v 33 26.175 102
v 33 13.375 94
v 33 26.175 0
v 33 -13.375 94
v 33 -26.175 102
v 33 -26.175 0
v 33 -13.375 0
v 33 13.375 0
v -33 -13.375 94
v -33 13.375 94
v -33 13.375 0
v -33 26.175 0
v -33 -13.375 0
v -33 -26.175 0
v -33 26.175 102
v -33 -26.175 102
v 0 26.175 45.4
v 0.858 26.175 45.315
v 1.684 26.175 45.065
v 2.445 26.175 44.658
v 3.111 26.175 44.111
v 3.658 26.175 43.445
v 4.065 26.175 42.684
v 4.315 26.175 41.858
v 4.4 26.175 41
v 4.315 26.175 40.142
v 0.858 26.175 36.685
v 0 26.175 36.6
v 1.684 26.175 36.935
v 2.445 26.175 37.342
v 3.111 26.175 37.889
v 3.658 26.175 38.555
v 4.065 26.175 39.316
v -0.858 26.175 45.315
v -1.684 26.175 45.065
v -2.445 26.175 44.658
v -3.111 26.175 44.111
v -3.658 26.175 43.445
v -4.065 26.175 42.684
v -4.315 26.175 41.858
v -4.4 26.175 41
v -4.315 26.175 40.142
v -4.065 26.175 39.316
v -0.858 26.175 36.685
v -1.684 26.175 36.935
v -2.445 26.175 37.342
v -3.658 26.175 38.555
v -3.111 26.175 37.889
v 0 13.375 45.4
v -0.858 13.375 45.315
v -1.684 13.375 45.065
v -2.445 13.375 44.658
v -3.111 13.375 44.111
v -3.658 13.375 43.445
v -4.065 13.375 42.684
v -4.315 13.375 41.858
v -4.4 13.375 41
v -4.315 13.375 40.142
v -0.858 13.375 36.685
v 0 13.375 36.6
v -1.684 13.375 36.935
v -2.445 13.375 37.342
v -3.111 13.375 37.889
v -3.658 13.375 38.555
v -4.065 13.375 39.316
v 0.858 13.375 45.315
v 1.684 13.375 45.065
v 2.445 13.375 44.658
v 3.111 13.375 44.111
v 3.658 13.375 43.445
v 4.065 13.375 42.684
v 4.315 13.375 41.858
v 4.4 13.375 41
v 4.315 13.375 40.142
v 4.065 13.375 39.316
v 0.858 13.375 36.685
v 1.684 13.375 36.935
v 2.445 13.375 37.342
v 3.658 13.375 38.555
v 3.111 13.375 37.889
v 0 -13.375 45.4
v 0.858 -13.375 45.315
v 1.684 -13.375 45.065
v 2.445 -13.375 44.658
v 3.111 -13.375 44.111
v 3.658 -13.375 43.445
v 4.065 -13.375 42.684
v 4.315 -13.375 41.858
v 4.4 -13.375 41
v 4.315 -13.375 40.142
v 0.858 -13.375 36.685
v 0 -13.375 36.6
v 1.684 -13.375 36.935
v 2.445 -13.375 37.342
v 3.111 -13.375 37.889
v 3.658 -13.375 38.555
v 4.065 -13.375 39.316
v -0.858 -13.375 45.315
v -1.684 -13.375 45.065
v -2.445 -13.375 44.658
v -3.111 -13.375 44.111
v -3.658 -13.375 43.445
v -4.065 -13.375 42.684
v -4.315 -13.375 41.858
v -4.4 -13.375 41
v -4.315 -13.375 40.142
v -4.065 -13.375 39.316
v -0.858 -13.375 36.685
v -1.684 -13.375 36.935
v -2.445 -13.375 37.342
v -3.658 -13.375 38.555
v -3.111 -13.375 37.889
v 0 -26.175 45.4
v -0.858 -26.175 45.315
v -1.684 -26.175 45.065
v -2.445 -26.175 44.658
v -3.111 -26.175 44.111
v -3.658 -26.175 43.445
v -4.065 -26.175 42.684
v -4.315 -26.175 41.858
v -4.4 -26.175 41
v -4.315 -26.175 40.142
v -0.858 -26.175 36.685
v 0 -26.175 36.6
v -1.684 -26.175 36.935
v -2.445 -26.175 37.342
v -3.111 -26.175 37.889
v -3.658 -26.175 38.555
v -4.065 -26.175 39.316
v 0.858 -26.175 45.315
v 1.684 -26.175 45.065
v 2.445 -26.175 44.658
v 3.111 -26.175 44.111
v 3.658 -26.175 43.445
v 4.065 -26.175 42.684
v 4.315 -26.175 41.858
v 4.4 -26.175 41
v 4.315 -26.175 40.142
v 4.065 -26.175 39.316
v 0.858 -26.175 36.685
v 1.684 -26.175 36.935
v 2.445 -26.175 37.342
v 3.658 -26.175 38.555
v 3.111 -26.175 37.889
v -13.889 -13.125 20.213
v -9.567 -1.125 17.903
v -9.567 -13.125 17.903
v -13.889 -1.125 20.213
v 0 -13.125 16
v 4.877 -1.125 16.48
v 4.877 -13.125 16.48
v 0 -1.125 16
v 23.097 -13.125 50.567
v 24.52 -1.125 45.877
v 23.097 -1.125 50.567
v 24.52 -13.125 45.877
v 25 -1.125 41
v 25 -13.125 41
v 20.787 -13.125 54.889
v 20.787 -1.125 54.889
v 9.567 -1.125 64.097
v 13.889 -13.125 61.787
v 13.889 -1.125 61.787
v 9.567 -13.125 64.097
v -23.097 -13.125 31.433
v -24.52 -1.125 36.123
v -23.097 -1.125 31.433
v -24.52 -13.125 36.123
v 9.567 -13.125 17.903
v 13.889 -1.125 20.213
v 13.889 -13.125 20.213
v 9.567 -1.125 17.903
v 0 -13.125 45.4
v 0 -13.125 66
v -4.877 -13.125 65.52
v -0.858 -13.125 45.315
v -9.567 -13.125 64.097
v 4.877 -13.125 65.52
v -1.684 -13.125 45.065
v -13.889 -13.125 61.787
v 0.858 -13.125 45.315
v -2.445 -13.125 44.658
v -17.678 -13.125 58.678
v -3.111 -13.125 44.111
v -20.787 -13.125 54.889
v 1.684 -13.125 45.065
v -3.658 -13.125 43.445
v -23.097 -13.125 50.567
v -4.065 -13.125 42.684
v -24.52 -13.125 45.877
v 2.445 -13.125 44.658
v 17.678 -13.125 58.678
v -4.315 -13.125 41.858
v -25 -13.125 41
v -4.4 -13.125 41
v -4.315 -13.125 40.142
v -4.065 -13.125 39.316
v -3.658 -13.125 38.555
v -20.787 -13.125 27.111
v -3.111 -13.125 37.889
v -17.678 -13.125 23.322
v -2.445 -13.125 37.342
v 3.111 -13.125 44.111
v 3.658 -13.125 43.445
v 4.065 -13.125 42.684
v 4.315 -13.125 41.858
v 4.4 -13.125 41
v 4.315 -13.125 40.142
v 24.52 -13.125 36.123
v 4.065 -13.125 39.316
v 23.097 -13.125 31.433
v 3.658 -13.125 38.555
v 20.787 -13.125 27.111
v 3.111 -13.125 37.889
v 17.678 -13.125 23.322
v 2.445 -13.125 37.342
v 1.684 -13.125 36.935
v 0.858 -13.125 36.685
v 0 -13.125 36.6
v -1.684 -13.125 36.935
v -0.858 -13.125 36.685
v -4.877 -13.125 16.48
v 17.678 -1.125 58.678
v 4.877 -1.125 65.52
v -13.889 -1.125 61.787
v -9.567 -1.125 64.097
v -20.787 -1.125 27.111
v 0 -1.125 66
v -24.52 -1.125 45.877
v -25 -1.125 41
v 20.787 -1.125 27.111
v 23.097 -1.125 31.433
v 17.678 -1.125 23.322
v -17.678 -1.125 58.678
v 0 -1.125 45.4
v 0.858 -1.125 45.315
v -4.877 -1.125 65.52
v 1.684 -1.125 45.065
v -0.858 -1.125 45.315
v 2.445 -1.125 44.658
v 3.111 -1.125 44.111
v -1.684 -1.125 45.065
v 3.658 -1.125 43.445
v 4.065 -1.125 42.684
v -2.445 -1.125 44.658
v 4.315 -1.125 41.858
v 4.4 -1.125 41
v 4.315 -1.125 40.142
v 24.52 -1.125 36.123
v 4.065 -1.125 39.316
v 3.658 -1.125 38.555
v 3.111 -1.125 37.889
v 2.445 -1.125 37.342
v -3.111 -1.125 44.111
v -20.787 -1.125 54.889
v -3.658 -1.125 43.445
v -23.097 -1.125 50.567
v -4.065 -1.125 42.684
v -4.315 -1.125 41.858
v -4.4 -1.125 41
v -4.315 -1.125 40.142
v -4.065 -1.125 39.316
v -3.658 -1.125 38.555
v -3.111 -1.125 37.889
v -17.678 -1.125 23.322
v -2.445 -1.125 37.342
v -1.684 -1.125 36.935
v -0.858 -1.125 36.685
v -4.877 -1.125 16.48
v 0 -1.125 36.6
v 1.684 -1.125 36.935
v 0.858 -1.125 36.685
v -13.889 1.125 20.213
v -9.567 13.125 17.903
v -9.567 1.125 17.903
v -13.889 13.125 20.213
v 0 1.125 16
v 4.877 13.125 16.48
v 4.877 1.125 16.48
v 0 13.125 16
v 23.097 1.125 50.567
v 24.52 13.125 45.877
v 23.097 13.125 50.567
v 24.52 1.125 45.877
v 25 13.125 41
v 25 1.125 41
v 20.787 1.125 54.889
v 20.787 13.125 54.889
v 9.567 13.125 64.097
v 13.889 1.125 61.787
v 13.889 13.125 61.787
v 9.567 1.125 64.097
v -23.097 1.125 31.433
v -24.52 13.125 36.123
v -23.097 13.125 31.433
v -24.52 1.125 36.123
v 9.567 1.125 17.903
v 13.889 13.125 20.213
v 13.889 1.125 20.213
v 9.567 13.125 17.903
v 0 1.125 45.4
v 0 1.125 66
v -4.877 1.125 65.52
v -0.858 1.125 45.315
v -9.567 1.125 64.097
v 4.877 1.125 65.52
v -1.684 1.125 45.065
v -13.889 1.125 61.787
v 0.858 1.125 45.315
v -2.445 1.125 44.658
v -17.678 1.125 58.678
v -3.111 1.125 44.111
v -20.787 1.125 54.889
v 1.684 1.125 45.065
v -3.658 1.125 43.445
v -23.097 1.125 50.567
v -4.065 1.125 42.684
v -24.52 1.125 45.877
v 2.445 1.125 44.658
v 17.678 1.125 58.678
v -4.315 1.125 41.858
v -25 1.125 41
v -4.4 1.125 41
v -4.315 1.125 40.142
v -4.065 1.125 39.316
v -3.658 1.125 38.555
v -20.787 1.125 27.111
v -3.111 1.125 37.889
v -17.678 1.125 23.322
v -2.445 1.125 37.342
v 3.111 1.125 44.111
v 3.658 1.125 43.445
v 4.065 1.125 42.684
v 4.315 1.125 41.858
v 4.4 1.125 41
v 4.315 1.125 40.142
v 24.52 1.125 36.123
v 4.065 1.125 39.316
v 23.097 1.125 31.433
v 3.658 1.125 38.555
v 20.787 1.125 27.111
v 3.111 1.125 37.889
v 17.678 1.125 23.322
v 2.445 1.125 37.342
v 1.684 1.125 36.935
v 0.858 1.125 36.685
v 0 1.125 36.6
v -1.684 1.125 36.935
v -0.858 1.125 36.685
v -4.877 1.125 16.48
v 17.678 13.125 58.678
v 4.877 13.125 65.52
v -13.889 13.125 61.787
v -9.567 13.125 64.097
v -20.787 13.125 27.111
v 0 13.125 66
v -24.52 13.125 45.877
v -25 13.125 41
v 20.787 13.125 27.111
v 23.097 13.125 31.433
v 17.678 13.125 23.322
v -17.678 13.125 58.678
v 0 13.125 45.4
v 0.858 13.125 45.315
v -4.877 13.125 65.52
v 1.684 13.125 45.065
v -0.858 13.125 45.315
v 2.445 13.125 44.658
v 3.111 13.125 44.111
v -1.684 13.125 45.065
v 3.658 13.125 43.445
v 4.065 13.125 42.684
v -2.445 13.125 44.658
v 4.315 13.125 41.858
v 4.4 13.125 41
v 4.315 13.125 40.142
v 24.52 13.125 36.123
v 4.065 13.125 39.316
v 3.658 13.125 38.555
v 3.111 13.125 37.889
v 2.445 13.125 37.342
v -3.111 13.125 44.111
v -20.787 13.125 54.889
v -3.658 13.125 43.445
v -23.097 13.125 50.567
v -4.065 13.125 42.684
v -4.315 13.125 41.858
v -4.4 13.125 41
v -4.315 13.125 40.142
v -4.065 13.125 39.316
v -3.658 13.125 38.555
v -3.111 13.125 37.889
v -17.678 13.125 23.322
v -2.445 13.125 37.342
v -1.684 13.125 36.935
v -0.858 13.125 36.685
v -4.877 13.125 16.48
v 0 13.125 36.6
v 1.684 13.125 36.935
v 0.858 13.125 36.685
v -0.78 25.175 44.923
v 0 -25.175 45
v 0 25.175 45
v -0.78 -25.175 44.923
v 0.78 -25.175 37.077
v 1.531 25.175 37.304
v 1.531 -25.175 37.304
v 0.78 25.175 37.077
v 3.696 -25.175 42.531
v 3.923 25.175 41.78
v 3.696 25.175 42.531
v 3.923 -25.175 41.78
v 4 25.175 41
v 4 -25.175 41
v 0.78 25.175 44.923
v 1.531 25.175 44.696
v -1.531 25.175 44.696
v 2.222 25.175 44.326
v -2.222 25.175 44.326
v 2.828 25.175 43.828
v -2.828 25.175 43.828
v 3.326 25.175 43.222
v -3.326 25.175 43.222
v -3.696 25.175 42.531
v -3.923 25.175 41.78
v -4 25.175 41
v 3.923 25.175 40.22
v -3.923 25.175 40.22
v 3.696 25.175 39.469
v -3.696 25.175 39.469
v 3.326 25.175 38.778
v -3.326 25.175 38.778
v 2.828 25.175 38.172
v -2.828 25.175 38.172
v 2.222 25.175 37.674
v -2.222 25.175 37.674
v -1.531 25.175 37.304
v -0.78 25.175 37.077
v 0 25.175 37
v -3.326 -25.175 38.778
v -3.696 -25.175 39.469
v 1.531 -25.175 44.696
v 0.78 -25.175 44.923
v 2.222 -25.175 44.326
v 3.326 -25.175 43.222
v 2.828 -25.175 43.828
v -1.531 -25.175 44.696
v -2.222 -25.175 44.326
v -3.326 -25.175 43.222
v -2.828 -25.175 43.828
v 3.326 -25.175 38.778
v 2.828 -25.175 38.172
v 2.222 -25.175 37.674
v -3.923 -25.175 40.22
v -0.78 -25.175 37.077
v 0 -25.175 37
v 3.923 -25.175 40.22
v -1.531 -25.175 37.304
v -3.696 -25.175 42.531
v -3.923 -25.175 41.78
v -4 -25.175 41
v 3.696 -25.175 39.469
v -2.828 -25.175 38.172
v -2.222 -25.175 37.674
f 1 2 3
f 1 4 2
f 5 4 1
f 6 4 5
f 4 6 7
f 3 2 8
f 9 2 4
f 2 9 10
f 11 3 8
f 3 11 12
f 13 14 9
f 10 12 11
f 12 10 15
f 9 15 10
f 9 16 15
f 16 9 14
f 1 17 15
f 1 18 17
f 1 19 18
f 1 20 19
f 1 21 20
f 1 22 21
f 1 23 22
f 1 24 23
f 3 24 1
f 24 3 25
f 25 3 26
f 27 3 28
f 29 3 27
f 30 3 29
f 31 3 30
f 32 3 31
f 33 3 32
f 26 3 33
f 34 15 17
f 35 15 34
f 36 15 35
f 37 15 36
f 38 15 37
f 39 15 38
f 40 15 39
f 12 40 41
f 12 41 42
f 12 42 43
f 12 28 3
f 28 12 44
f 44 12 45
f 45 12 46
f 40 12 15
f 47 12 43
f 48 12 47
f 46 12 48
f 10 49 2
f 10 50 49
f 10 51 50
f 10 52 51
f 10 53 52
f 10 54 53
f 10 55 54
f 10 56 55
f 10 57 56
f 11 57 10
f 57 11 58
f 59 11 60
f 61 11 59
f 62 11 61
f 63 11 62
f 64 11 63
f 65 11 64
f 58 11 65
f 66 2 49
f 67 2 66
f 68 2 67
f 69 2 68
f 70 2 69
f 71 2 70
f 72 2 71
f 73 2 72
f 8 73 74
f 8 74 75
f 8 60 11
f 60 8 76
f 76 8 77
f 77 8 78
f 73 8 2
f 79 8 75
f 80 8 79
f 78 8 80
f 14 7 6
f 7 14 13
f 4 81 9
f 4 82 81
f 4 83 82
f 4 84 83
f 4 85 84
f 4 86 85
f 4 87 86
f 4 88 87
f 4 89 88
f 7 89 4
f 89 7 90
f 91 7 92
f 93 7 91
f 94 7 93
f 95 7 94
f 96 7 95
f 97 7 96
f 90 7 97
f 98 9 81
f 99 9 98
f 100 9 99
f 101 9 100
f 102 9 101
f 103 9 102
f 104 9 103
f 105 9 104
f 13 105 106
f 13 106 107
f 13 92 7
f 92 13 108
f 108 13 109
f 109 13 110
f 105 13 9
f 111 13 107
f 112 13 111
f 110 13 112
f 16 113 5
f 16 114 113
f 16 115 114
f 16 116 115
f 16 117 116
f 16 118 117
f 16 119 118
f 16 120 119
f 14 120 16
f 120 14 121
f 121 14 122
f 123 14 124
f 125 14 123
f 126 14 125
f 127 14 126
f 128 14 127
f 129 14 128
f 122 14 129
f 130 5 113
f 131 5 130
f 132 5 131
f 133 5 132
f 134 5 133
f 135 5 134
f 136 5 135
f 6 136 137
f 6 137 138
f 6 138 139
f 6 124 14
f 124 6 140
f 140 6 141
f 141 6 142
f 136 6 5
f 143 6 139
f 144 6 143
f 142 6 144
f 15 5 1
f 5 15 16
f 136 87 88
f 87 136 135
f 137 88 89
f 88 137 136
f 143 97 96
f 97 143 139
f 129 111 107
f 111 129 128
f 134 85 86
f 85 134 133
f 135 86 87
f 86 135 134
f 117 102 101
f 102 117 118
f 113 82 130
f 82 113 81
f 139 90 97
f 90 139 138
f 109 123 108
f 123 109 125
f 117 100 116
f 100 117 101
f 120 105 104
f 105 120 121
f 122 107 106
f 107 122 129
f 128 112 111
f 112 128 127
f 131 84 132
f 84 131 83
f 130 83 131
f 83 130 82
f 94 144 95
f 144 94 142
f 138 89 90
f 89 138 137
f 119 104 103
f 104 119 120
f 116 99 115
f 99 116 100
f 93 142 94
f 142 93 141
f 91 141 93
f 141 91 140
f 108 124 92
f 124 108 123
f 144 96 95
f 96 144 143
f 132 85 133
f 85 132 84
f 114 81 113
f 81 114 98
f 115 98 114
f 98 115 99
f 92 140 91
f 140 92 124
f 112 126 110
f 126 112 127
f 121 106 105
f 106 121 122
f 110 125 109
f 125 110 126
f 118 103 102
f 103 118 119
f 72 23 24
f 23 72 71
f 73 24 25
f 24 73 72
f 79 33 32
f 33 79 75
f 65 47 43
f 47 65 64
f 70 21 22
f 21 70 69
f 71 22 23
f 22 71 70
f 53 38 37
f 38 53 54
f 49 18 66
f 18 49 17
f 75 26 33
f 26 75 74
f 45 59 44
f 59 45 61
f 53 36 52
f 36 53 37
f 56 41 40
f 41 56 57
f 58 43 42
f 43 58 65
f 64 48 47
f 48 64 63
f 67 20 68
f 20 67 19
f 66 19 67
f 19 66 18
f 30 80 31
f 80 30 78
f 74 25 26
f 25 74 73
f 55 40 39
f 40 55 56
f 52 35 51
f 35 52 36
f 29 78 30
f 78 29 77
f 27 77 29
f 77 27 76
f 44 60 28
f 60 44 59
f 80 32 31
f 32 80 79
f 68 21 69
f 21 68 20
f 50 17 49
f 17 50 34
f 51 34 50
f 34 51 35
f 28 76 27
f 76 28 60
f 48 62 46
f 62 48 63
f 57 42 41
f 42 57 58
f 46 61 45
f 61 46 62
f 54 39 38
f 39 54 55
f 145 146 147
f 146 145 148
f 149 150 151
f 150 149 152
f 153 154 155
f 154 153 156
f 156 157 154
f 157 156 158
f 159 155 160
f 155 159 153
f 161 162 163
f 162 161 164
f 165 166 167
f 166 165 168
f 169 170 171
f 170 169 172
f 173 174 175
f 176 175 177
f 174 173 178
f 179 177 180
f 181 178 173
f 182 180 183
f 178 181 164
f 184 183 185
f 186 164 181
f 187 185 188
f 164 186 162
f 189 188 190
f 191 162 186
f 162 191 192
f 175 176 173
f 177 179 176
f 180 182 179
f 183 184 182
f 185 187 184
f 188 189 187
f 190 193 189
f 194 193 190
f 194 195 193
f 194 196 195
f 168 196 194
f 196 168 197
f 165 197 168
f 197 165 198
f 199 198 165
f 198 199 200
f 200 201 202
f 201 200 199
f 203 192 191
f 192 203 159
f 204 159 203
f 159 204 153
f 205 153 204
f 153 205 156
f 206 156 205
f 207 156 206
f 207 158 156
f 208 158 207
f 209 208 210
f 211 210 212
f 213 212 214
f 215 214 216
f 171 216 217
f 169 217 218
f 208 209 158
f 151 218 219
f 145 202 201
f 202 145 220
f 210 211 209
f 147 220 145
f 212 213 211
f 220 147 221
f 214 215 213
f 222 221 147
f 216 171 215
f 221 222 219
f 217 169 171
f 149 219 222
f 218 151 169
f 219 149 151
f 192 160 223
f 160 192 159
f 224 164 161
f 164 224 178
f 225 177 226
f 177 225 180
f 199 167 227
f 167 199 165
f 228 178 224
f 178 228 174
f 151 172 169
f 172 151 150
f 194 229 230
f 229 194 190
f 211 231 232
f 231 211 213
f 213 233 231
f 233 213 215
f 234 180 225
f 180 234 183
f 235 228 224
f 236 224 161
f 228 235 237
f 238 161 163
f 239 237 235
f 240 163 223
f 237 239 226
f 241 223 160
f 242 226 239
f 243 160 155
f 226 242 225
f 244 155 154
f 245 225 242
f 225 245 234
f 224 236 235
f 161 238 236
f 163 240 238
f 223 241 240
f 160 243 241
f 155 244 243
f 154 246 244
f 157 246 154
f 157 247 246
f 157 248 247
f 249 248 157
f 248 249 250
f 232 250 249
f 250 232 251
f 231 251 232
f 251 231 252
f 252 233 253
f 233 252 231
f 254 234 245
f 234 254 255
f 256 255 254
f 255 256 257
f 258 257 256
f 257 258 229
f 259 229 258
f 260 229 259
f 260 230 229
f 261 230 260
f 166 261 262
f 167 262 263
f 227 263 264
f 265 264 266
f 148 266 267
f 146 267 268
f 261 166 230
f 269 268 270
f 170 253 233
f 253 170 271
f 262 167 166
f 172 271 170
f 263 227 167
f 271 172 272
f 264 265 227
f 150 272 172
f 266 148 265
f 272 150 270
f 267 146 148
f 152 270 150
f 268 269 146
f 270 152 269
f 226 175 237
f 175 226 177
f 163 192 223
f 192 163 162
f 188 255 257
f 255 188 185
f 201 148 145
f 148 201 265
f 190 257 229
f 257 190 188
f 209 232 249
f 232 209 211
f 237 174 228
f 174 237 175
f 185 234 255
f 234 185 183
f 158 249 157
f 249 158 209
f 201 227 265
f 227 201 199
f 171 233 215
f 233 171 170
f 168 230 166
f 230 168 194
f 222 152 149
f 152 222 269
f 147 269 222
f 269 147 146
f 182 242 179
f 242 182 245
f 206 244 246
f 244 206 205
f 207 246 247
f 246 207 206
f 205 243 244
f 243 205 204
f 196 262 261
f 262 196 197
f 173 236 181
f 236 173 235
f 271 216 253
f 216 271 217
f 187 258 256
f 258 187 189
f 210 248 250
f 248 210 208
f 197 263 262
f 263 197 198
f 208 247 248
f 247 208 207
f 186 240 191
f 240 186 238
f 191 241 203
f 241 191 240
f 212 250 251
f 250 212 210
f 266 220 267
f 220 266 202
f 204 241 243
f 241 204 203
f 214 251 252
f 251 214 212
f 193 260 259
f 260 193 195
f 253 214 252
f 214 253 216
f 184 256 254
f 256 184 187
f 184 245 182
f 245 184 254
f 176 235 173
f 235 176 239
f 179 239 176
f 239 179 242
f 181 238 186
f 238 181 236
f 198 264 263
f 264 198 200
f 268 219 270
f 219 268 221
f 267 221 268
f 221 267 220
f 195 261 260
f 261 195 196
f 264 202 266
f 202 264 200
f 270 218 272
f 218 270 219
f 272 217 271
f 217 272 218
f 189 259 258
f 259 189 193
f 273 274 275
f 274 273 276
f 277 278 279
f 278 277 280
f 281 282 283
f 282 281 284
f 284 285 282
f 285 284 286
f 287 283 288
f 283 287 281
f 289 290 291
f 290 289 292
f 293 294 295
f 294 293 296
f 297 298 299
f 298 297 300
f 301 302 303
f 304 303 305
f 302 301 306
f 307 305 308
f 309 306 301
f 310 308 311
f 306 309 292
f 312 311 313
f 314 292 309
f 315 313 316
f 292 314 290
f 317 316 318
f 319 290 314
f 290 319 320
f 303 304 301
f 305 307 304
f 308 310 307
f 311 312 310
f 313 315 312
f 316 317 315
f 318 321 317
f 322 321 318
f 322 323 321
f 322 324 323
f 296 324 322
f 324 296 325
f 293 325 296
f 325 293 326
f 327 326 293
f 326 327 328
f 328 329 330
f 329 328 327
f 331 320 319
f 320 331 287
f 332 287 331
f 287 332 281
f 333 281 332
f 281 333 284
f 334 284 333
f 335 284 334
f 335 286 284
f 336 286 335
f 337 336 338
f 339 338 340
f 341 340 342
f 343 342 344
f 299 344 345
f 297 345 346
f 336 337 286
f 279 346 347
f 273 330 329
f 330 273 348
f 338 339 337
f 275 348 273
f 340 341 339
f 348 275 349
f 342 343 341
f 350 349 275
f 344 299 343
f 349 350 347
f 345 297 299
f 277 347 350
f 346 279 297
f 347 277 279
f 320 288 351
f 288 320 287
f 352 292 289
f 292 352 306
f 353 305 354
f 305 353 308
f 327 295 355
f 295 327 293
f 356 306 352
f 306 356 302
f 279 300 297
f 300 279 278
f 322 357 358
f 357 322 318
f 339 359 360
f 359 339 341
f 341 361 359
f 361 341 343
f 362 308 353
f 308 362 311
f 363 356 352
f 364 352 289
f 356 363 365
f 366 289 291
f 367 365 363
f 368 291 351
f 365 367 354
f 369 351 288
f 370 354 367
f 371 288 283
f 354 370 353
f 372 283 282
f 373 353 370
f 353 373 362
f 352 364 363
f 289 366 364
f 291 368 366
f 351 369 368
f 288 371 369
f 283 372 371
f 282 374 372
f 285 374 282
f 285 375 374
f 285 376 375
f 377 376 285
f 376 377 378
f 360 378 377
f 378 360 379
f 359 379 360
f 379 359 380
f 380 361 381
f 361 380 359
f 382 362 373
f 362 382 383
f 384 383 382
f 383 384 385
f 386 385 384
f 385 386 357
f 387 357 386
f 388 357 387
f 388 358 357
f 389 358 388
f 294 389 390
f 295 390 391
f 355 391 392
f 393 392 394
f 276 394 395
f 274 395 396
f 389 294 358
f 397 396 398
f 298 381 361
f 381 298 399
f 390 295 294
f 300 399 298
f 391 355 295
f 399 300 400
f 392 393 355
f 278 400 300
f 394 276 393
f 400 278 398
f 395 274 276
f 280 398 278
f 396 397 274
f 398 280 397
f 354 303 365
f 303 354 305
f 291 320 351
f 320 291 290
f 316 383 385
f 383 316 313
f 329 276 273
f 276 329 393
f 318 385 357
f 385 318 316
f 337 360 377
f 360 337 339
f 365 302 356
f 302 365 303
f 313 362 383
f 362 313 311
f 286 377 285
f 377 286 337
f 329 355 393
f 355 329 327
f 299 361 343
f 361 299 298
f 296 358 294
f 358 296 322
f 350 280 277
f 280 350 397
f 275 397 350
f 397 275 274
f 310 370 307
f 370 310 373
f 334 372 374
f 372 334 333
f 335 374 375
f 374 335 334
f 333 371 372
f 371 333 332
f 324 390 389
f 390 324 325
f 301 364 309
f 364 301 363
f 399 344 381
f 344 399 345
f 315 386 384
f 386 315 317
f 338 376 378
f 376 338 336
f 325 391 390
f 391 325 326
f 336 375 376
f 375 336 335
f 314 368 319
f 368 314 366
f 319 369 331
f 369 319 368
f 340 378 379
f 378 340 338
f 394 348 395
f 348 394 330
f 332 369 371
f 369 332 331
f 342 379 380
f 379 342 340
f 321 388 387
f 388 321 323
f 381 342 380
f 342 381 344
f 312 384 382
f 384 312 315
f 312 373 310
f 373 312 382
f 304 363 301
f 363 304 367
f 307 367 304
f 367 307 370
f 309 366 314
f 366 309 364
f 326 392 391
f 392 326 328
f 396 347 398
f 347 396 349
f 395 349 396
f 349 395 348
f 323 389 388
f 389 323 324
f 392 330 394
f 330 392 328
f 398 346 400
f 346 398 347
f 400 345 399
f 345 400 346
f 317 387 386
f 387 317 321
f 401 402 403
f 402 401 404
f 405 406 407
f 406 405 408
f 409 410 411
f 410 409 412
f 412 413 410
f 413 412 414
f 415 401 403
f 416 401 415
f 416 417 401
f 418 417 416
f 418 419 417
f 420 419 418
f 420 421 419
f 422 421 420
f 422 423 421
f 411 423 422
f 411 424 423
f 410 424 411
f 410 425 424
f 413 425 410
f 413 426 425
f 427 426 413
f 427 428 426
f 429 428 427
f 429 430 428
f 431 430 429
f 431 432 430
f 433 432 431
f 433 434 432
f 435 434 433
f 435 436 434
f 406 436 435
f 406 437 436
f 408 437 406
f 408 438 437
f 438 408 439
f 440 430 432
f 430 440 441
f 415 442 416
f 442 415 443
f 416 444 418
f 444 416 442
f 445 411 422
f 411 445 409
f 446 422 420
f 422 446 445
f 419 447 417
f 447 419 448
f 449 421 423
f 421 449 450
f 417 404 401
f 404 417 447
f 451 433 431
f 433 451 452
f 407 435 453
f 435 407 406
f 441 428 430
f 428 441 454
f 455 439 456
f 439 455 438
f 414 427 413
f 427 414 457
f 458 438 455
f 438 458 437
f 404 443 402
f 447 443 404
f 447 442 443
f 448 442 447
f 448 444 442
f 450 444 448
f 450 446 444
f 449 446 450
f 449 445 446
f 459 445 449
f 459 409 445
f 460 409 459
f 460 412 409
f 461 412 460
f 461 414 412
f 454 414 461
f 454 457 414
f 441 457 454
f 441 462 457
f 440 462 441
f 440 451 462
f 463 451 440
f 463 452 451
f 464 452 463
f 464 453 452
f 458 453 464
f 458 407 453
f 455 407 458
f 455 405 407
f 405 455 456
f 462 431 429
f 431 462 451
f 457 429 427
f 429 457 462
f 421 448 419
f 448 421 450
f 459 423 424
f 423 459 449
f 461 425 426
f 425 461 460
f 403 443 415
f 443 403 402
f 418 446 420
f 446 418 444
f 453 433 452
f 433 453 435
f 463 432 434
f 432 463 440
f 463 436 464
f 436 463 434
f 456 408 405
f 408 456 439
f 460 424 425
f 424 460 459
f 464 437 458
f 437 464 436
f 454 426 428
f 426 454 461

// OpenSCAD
$fn = 32;

// ------------------------------------------------------------------------
// Trolley wheel set: wheels d50, fork 94 mm tall
// Every part is its own module, assembly() places every instance.
// ------------------------------------------------------------------------

// --- part 1 ---
module trolley_fork() {
  difference() {
    union() {
      translate([-33, 13.375, 0]) cube([66, 12.8, 94]);
      translate([-33, -26.175, 0]) cube([66, 12.8, 94]);
      translate([-33, -26.175, 94]) cube([66, 52.35, 8]);
    }
    translate([0, -19.775, 41]) rotate([90, 0, 0]) cylinder(h = 14.8, d = 8.8, center = true);
    translate([0, 19.775, 41]) rotate([90, 0, 0]) cylinder(h = 14.8, d = 8.8, center = true);
  }
}

// --- part 2 ---
module trolley_wheel() {
  difference() {
      translate([0, 0, 0]) cylinder(h = 12, d = 50);
      translate([0, 0, -1]) cylinder(h = 14, d = 8.8);
    }
}

// --- part 3 ---
module trolley_axle() {
  translate([0, 0, -25.175]) cylinder(h = 50.35, d = 8);
}

// --- assembly ---
module assembly() {
  color([0.80, 0.24, 0.20]) translate([0, 0, 0]) rotate([0, 0, 0]) trolley_fork();
  color([0.20, 0.45, 0.75]) translate([0, -1.125, 41]) rotate([90, 0, 0]) trolley_wheel();
  color([0.25, 0.62, 0.32]) translate([0, 13.125, 41]) rotate([90, 0, 0]) trolley_wheel();
  color([0.92, 0.70, 0.18]) translate([0, 0, 41]) rotate([90, 0, 0]) trolley_axle();
}

assembly();
